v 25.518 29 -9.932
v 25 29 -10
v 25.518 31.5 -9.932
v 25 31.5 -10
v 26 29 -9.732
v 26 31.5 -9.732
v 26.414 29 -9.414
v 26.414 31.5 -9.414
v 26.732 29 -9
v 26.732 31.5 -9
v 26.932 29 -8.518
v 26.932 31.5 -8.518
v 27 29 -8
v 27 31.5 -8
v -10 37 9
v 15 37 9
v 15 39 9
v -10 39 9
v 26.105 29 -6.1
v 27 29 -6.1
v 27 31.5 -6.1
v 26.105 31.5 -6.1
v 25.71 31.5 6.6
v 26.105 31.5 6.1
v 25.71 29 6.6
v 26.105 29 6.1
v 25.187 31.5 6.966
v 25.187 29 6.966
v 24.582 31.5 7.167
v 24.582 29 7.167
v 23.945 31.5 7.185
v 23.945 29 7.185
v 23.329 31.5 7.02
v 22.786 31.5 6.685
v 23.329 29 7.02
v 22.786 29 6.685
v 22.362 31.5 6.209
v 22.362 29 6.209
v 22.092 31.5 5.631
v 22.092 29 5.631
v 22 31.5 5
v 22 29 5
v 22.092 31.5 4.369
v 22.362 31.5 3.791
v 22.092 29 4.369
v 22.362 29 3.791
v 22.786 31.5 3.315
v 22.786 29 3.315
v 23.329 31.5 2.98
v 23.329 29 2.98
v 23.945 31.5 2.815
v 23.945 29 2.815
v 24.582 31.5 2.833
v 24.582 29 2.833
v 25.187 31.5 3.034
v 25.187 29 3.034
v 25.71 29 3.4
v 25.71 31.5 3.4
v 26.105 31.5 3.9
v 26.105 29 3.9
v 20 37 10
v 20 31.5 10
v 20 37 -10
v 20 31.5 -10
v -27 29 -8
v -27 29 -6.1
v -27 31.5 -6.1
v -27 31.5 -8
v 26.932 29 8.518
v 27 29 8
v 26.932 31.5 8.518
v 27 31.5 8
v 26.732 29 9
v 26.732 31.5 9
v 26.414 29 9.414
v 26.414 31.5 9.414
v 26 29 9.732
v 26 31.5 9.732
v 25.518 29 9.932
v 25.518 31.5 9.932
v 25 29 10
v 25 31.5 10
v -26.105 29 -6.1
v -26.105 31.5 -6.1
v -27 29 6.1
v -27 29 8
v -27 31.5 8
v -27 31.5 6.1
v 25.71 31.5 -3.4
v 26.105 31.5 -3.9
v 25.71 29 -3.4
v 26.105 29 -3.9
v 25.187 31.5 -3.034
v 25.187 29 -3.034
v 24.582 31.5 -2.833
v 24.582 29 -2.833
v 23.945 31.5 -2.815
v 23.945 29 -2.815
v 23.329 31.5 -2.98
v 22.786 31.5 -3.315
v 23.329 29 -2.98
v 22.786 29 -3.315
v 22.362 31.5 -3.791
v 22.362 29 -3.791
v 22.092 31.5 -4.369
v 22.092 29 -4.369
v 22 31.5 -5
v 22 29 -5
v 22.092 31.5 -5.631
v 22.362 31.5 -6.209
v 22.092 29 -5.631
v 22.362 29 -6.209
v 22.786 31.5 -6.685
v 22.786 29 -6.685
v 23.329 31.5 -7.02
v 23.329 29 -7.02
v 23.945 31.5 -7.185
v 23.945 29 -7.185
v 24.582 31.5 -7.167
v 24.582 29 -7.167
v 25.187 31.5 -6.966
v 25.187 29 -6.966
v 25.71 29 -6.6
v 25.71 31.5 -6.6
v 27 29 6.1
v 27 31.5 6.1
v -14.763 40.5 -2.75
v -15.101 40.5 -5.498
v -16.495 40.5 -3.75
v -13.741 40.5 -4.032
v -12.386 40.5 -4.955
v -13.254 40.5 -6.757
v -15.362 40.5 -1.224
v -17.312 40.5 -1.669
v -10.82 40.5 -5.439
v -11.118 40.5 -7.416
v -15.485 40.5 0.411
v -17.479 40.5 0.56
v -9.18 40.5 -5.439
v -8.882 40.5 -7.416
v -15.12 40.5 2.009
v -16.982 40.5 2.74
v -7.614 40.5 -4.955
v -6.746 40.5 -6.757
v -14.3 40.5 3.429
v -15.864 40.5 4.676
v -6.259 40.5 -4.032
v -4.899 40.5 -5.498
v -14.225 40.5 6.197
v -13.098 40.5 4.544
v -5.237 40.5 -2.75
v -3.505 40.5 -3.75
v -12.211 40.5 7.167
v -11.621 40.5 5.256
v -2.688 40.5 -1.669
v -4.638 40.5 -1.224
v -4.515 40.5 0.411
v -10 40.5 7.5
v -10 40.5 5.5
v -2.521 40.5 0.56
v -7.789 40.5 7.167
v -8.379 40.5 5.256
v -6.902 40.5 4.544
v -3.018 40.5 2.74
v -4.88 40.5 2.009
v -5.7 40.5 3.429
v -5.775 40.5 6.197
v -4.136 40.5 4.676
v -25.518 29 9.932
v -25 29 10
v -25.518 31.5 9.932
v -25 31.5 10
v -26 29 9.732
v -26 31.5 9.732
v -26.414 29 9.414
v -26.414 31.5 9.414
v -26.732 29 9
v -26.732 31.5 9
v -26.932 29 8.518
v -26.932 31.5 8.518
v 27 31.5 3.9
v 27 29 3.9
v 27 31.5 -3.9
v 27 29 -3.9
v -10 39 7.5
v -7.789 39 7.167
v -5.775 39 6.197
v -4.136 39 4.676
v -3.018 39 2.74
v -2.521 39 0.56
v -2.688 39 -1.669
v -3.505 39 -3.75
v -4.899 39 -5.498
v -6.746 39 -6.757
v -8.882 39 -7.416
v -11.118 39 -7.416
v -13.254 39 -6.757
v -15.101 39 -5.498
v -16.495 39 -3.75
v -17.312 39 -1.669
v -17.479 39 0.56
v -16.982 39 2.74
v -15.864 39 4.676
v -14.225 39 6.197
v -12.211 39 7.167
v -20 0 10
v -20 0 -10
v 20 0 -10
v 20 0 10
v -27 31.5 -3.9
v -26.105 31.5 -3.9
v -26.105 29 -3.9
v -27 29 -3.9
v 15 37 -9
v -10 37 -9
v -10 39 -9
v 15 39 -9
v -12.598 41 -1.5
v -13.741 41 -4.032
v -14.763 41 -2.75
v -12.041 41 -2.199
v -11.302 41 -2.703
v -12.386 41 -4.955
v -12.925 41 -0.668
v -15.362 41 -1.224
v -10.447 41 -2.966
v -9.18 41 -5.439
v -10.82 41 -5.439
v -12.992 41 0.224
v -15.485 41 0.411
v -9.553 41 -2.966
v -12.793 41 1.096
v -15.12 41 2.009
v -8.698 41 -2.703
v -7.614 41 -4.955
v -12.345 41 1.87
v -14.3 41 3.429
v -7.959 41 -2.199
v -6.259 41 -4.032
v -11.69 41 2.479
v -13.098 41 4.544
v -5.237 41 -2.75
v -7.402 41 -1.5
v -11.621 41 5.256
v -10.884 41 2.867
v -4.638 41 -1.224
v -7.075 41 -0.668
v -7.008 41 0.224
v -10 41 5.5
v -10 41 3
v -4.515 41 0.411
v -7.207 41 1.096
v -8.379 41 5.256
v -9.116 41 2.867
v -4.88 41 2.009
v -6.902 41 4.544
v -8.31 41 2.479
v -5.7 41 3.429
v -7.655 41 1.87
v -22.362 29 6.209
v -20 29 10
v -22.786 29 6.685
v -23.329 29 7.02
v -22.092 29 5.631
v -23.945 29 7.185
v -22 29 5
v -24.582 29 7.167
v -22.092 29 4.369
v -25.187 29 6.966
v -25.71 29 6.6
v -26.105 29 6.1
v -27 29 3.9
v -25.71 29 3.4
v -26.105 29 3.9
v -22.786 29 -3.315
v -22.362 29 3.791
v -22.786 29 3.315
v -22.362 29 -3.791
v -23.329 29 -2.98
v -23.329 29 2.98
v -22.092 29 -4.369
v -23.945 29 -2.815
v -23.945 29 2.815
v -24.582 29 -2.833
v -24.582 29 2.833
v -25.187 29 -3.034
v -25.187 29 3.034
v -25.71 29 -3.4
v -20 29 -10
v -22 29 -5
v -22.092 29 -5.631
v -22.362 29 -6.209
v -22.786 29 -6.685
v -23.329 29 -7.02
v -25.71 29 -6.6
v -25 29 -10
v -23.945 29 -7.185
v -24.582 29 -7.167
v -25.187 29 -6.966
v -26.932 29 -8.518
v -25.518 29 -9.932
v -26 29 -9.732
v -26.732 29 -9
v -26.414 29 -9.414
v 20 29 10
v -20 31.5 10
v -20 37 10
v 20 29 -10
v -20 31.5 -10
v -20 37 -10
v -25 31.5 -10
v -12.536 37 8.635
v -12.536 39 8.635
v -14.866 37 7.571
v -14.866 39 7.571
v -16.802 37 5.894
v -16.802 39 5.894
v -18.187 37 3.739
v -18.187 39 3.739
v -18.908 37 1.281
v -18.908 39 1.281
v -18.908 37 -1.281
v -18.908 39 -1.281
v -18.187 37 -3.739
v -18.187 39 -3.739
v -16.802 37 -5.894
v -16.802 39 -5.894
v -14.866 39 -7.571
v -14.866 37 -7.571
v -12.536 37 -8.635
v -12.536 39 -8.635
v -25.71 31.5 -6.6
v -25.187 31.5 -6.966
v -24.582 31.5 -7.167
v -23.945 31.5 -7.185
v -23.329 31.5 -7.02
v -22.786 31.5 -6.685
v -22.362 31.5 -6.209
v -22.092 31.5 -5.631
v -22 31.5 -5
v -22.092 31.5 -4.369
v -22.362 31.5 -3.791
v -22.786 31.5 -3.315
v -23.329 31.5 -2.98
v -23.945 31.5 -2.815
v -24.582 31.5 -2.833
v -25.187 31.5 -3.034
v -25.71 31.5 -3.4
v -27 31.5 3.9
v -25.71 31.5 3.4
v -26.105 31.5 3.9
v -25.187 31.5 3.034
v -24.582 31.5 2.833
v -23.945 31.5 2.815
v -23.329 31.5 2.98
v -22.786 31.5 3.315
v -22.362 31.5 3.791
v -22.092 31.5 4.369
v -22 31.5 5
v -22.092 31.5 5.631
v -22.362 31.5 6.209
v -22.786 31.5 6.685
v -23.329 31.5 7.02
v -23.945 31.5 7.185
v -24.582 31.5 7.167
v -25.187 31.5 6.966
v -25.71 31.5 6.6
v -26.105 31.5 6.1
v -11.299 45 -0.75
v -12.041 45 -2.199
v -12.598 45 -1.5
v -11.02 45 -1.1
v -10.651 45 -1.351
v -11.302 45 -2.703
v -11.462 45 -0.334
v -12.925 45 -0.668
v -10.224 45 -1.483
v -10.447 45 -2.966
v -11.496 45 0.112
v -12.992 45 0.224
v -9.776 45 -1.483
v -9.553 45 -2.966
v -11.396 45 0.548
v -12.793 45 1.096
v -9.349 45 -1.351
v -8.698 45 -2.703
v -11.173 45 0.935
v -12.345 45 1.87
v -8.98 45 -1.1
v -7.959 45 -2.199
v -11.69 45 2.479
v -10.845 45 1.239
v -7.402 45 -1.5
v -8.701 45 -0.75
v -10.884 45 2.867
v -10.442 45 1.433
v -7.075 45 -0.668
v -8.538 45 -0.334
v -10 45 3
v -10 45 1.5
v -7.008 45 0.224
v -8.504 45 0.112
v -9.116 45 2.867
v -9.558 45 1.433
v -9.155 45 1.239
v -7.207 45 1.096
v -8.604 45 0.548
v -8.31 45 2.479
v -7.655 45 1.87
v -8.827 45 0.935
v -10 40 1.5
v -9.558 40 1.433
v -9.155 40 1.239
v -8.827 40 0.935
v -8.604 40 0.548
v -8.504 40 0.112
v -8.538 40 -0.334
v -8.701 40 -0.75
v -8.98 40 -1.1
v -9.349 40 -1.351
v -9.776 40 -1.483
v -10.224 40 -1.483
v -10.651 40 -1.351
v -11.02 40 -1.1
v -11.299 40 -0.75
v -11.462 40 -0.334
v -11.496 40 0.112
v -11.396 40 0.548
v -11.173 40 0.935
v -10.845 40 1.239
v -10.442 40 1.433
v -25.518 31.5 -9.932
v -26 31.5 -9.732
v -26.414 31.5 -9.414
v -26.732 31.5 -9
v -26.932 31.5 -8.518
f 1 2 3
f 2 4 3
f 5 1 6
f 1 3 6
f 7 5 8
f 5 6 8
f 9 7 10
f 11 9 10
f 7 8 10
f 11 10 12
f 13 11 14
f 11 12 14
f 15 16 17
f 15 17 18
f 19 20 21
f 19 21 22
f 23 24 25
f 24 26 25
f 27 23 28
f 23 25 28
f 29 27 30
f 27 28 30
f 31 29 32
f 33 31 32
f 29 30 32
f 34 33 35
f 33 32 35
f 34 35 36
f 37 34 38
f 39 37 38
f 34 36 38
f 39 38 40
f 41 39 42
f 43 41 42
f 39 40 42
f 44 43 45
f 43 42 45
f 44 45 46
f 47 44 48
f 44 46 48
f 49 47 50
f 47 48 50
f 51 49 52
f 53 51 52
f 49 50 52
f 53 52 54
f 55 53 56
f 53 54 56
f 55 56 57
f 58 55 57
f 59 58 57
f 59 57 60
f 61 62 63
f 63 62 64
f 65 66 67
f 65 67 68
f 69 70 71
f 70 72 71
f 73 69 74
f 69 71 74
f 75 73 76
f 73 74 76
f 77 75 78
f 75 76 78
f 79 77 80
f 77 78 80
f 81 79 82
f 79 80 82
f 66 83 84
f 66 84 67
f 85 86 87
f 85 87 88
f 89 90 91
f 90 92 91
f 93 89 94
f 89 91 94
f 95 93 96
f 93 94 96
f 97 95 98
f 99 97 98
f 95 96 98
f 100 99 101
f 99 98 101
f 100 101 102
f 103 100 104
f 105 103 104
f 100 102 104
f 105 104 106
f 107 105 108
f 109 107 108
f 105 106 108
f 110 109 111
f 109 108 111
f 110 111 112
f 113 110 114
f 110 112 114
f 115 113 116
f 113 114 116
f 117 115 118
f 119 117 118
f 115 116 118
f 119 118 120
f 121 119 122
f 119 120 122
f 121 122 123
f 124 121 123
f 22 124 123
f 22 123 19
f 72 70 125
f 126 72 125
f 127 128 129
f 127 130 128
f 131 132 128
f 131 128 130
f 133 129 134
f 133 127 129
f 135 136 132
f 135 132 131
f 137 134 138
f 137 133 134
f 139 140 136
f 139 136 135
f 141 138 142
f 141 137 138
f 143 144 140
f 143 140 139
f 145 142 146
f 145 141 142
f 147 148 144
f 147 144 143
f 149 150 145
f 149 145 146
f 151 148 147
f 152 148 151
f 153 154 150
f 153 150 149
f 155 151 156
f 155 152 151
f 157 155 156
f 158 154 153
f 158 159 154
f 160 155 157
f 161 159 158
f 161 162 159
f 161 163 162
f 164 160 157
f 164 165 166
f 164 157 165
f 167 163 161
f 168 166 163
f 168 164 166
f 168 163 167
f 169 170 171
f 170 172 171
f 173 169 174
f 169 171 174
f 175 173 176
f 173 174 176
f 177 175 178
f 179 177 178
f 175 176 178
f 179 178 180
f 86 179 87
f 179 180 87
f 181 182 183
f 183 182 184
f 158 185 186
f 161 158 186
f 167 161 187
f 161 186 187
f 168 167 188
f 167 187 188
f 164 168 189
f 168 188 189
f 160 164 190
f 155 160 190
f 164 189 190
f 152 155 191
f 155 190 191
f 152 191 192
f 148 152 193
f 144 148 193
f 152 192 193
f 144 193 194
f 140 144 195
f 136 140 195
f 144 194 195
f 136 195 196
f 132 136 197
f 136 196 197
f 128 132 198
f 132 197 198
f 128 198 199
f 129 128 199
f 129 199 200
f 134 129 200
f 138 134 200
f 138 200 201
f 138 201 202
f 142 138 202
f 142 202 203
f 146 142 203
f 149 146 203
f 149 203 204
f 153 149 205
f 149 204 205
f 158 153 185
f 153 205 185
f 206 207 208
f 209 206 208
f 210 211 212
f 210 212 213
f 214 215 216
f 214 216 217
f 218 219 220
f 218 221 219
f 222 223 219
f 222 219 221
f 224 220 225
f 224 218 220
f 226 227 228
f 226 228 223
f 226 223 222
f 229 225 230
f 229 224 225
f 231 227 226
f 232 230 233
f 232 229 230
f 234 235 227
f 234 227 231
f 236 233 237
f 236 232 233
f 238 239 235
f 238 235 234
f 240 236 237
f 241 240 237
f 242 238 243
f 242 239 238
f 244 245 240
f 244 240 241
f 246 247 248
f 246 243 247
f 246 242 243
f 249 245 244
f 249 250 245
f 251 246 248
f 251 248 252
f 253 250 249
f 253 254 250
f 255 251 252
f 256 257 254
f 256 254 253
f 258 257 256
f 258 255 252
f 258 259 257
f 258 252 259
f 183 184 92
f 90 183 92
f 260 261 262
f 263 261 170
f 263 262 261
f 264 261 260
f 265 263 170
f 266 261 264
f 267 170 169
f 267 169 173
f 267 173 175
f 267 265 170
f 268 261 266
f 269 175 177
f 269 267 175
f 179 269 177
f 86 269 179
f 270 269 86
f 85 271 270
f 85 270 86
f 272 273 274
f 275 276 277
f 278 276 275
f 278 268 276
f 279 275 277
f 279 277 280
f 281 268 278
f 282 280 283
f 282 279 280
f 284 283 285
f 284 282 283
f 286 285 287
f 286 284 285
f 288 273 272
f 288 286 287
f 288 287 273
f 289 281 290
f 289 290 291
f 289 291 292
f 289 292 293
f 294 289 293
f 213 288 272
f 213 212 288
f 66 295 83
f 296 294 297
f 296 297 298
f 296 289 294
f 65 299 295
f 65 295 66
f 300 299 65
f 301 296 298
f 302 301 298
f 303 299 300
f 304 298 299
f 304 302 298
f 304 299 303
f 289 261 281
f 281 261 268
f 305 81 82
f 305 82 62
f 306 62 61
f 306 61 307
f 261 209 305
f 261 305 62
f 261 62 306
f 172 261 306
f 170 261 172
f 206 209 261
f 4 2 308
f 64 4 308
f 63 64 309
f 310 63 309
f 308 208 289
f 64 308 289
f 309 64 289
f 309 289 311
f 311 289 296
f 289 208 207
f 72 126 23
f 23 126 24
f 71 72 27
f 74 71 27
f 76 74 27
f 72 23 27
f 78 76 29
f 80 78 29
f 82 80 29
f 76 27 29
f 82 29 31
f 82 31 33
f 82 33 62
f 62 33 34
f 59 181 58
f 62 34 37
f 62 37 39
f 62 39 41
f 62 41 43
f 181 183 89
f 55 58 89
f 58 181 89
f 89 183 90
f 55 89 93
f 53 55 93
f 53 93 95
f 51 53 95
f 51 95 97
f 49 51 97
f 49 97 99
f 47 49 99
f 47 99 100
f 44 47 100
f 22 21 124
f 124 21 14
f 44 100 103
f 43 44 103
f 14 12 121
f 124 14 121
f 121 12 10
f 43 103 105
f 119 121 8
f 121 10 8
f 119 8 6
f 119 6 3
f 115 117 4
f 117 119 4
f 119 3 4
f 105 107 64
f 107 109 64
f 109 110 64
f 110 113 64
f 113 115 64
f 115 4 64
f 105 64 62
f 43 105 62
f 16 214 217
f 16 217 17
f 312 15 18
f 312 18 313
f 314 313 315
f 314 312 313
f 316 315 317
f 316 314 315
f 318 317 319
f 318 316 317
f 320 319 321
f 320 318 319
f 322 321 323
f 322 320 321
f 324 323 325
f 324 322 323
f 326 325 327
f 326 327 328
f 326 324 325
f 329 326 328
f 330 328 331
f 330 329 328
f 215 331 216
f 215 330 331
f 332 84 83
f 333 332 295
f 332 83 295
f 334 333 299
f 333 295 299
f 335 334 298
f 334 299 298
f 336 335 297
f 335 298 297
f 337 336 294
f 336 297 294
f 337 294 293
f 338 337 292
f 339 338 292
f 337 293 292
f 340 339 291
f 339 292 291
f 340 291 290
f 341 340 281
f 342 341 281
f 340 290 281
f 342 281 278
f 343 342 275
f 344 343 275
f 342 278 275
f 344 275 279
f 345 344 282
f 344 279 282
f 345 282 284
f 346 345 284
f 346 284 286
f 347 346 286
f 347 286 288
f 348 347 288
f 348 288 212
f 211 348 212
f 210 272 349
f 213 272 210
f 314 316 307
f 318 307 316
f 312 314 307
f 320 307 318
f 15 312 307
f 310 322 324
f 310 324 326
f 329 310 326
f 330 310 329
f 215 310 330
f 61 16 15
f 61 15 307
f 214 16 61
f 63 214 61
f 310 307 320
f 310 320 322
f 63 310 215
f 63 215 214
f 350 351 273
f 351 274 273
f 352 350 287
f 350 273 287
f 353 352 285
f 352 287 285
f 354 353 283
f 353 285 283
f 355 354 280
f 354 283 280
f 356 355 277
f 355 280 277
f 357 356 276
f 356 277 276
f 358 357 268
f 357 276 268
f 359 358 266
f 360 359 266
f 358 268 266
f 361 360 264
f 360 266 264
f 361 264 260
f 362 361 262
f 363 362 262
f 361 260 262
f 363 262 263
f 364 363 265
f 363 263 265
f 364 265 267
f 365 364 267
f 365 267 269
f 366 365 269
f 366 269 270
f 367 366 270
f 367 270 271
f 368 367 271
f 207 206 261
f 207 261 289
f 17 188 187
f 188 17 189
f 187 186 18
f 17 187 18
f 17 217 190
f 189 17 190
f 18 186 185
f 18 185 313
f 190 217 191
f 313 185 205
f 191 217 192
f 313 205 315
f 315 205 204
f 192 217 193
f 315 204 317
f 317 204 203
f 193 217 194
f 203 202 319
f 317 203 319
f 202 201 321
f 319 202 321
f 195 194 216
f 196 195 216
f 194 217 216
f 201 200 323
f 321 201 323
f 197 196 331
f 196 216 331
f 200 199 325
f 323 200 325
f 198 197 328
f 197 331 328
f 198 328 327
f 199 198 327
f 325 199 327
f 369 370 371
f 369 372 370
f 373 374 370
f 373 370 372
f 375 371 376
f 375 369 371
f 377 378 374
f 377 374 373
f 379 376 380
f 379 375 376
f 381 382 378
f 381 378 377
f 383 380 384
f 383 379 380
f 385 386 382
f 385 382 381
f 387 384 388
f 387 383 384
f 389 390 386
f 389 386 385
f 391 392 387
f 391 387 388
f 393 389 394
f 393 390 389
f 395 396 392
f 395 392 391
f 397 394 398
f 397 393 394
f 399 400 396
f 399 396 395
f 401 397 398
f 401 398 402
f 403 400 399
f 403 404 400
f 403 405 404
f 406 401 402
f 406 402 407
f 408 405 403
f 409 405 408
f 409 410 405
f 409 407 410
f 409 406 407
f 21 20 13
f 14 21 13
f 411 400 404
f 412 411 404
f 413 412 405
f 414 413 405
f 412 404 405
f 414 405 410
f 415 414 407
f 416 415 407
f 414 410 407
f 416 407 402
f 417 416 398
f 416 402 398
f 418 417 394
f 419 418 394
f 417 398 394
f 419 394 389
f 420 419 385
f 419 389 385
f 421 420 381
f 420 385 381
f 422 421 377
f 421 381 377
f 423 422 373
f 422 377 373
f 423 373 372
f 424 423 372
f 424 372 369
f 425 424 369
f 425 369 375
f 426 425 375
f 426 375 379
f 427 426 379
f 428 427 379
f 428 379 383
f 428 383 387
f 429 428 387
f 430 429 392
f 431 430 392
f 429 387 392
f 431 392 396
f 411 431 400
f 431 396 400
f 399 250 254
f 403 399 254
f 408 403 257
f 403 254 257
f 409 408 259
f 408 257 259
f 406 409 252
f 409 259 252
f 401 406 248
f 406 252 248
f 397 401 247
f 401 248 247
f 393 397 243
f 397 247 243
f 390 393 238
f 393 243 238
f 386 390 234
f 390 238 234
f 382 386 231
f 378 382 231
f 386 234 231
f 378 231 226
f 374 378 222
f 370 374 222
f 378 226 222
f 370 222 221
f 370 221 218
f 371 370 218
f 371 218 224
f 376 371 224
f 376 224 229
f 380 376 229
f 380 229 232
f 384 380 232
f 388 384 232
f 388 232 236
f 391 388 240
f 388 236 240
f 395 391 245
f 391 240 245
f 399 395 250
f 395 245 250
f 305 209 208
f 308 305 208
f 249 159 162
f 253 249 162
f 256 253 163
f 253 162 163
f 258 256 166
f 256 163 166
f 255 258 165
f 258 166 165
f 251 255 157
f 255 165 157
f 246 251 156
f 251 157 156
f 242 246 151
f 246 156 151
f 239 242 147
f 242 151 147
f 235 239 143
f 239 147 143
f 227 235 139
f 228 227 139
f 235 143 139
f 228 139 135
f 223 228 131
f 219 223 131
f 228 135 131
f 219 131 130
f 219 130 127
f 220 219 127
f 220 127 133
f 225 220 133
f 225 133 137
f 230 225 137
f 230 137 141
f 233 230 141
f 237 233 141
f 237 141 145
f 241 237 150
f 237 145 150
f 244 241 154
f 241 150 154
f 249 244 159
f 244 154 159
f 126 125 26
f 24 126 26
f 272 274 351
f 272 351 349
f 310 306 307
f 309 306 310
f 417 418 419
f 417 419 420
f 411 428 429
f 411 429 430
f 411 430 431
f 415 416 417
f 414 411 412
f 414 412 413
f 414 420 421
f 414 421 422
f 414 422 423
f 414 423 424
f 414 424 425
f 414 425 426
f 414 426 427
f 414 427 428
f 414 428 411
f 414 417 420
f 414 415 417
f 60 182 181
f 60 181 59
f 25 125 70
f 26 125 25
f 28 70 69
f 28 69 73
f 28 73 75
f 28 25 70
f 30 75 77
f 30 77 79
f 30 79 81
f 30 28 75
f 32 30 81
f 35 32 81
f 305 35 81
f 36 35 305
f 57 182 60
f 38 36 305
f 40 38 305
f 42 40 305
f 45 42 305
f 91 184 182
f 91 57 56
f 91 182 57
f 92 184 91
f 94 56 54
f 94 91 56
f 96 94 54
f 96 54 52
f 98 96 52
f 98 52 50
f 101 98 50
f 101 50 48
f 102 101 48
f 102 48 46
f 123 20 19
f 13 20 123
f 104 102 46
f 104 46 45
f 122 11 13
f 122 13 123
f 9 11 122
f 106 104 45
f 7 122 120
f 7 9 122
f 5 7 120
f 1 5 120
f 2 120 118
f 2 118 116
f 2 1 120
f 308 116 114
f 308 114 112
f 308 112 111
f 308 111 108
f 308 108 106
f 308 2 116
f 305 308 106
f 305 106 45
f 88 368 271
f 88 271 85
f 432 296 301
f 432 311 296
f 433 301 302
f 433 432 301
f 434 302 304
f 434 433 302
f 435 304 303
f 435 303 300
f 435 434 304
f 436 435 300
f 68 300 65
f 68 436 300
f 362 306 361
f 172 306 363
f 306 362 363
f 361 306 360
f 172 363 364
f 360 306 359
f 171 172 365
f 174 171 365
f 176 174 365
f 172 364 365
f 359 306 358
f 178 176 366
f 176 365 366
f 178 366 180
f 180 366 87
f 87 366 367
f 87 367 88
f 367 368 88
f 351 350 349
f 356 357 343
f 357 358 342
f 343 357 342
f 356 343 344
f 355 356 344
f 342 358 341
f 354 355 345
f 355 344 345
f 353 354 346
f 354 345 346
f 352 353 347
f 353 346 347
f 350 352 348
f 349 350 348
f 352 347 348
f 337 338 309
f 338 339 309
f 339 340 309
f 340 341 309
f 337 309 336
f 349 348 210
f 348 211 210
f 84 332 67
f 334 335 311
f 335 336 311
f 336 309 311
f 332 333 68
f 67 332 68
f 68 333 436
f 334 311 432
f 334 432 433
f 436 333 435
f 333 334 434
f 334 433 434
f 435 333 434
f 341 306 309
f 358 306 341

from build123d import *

# Parameters (mm, degrees)
SKETCH_1_W          = 40
SKETCH_1_H          = 20
EXTRUDE_1_DEPTH     = 37
SKETCH_2_W          = 54
SKETCH_2_H          = 20
EXTRUDE_2_DEPTH     = 2.5
SKETCH_3_R          = 2.2
CUT_EXTRUDE_1_DEPTH = 2.5
SKETCH_5_W          = 1.5
SKETCH_5_H          = 2.2
CUT_EXTRUDE_2_DEPTH = 2.5
FILLET_1_R          = 2
EXTRUDE_3_DEPTH     = 2
SKETCH_7_R          = 7.5
EXTRUDE_4_DEPTH     = 1.5
SKETCH_8_R          = 5.5
EXTRUDE_5_DEPTH     = 0.5
SKETCH_9_R          = 3
EXTRUDE_6_DEPTH     = 4
SKETCH_10_R         = 1.5
CUT_EXTRUDE_3_DEPTH = 5


with BuildPart() as part:
    # 草图1 → 凸台-拉伸1 (new body)
    with BuildSketch(Plane(origin=(0, 0, 0), x_dir=(1, 0, 0), z_dir=(0, 1, 0))):
        Rectangle(SKETCH_1_W, SKETCH_1_H)
    extrude(amount=EXTRUDE_1_DEPTH)

    # 草图2 → 凸台-拉伸2 (add)
    with BuildSketch(Plane(origin=(0, 29, 0), x_dir=(-1, 0, 0), z_dir=(0, -1, 0))):
        Rectangle(SKETCH_2_W, SKETCH_2_H)
    extrude(amount=-EXTRUDE_2_DEPTH)

    # 草图3 → 切除-拉伸1 (cut)
    with BuildSketch(Plane(origin=(0, 29, 0), x_dir=(-1, 0, 0), z_dir=(0, -1, 0))):
        with Locations(Location((24.2, 5, 0), (0, 0, 90))):
            Circle(SKETCH_3_R)
        with Locations(Location((-24.2, 5, 0), (0, 0, 90))):
            Circle(SKETCH_3_R)
        with Locations(Location((24.2, -5, 0), (0, 0, 90))):
            Circle(SKETCH_3_R)
        with Locations(Location((-24.2, -5, 0), (0, 0, 90))):
            Circle(SKETCH_3_R)
    extrude(amount=-CUT_EXTRUDE_1_DEPTH, mode=Mode.SUBTRACT)

    # 草图5 → 切除-拉伸2 (cut)
    with BuildSketch(Plane(origin=(0, 29, 0), x_dir=(-1, 0, 0), z_dir=(0, -1, 0))):
        with Locations((-26.25, 5)):
            Rectangle(SKETCH_5_W, SKETCH_5_H)
        with Locations((26.25, 5)):
            Rectangle(SKETCH_5_W, SKETCH_5_H)
        with Locations((26.25, -5)):
            Rectangle(SKETCH_5_W, SKETCH_5_H)
        with Locations((-26.25, -5)):
            Rectangle(SKETCH_5_W, SKETCH_5_H)
    extrude(amount=-CUT_EXTRUDE_2_DEPTH, mode=Mode.SUBTRACT)

    # 圆角1
    fillet_1_edges = [part.edges().sort_by_distance(p)[0] for p in [
        (27, 30.25, -10),
        (-27, 30.25, 10),
        (27, 30.25, 10),
        (-27, 30.25, -10),
    ]]
    fillet(fillet_1_edges, radius=FILLET_1_R)

    # 草图6 → 凸台-拉伸3 (add)
    with BuildSketch(Plane(origin=(0, 37, 0), x_dir=(1, 0, 0), z_dir=(0, 1, 0))):
        with BuildLine():
            Line((-10, 9), (15, 9))
            Line((15, 9), (15, -9))
            Line((15, -9), (-10, -9))
            ThreePointArc((-10, -9), (-19, 0), (-10, 9))
        make_face()
    extrude(amount=EXTRUDE_3_DEPTH)

    # 草图7 → 凸台-拉伸4 (add)
    with BuildSketch(Plane(origin=(0, 39, 0), x_dir=(1, 0, 0), z_dir=(0, 1, 0))):
        with Locations(Location((-10, 0, 0), (0, 0, 270))):
            Circle(SKETCH_7_R)
    extrude(amount=EXTRUDE_4_DEPTH)

    # 草图8 → 凸台-拉伸5 (add)
    with BuildSketch(Plane(origin=(0, 40.5, 0), x_dir=(1, 0, 0), z_dir=(0, 1, 0))):
        with Locations(Location((-10, 0, 0), (0, 0, 270))):
            Circle(SKETCH_8_R)
    extrude(amount=EXTRUDE_5_DEPTH)

    # 草图9 → 凸台-拉伸6 (add)
    with BuildSketch(Plane(origin=(0, 41, 0), x_dir=(1, 0, 0), z_dir=(0, 1, 0))):
        with Locations(Location((-10, 0, 0), (0, 0, 270))):
            Circle(SKETCH_9_R)
    extrude(amount=EXTRUDE_6_DEPTH)

    # 草图10 → 切除-拉伸3 (cut)
    with BuildSketch(Plane(origin=(0, 45, 0), x_dir=(1, 0, 0), z_dir=(0, 1, 0))):
        with Locations(Location((-10, 0, 0), (0, 0, 270))):
            Circle(SKETCH_10_R)
    extrude(amount=-CUT_EXTRUDE_3_DEPTH, mode=Mode.SUBTRACT)


solid = part.part
